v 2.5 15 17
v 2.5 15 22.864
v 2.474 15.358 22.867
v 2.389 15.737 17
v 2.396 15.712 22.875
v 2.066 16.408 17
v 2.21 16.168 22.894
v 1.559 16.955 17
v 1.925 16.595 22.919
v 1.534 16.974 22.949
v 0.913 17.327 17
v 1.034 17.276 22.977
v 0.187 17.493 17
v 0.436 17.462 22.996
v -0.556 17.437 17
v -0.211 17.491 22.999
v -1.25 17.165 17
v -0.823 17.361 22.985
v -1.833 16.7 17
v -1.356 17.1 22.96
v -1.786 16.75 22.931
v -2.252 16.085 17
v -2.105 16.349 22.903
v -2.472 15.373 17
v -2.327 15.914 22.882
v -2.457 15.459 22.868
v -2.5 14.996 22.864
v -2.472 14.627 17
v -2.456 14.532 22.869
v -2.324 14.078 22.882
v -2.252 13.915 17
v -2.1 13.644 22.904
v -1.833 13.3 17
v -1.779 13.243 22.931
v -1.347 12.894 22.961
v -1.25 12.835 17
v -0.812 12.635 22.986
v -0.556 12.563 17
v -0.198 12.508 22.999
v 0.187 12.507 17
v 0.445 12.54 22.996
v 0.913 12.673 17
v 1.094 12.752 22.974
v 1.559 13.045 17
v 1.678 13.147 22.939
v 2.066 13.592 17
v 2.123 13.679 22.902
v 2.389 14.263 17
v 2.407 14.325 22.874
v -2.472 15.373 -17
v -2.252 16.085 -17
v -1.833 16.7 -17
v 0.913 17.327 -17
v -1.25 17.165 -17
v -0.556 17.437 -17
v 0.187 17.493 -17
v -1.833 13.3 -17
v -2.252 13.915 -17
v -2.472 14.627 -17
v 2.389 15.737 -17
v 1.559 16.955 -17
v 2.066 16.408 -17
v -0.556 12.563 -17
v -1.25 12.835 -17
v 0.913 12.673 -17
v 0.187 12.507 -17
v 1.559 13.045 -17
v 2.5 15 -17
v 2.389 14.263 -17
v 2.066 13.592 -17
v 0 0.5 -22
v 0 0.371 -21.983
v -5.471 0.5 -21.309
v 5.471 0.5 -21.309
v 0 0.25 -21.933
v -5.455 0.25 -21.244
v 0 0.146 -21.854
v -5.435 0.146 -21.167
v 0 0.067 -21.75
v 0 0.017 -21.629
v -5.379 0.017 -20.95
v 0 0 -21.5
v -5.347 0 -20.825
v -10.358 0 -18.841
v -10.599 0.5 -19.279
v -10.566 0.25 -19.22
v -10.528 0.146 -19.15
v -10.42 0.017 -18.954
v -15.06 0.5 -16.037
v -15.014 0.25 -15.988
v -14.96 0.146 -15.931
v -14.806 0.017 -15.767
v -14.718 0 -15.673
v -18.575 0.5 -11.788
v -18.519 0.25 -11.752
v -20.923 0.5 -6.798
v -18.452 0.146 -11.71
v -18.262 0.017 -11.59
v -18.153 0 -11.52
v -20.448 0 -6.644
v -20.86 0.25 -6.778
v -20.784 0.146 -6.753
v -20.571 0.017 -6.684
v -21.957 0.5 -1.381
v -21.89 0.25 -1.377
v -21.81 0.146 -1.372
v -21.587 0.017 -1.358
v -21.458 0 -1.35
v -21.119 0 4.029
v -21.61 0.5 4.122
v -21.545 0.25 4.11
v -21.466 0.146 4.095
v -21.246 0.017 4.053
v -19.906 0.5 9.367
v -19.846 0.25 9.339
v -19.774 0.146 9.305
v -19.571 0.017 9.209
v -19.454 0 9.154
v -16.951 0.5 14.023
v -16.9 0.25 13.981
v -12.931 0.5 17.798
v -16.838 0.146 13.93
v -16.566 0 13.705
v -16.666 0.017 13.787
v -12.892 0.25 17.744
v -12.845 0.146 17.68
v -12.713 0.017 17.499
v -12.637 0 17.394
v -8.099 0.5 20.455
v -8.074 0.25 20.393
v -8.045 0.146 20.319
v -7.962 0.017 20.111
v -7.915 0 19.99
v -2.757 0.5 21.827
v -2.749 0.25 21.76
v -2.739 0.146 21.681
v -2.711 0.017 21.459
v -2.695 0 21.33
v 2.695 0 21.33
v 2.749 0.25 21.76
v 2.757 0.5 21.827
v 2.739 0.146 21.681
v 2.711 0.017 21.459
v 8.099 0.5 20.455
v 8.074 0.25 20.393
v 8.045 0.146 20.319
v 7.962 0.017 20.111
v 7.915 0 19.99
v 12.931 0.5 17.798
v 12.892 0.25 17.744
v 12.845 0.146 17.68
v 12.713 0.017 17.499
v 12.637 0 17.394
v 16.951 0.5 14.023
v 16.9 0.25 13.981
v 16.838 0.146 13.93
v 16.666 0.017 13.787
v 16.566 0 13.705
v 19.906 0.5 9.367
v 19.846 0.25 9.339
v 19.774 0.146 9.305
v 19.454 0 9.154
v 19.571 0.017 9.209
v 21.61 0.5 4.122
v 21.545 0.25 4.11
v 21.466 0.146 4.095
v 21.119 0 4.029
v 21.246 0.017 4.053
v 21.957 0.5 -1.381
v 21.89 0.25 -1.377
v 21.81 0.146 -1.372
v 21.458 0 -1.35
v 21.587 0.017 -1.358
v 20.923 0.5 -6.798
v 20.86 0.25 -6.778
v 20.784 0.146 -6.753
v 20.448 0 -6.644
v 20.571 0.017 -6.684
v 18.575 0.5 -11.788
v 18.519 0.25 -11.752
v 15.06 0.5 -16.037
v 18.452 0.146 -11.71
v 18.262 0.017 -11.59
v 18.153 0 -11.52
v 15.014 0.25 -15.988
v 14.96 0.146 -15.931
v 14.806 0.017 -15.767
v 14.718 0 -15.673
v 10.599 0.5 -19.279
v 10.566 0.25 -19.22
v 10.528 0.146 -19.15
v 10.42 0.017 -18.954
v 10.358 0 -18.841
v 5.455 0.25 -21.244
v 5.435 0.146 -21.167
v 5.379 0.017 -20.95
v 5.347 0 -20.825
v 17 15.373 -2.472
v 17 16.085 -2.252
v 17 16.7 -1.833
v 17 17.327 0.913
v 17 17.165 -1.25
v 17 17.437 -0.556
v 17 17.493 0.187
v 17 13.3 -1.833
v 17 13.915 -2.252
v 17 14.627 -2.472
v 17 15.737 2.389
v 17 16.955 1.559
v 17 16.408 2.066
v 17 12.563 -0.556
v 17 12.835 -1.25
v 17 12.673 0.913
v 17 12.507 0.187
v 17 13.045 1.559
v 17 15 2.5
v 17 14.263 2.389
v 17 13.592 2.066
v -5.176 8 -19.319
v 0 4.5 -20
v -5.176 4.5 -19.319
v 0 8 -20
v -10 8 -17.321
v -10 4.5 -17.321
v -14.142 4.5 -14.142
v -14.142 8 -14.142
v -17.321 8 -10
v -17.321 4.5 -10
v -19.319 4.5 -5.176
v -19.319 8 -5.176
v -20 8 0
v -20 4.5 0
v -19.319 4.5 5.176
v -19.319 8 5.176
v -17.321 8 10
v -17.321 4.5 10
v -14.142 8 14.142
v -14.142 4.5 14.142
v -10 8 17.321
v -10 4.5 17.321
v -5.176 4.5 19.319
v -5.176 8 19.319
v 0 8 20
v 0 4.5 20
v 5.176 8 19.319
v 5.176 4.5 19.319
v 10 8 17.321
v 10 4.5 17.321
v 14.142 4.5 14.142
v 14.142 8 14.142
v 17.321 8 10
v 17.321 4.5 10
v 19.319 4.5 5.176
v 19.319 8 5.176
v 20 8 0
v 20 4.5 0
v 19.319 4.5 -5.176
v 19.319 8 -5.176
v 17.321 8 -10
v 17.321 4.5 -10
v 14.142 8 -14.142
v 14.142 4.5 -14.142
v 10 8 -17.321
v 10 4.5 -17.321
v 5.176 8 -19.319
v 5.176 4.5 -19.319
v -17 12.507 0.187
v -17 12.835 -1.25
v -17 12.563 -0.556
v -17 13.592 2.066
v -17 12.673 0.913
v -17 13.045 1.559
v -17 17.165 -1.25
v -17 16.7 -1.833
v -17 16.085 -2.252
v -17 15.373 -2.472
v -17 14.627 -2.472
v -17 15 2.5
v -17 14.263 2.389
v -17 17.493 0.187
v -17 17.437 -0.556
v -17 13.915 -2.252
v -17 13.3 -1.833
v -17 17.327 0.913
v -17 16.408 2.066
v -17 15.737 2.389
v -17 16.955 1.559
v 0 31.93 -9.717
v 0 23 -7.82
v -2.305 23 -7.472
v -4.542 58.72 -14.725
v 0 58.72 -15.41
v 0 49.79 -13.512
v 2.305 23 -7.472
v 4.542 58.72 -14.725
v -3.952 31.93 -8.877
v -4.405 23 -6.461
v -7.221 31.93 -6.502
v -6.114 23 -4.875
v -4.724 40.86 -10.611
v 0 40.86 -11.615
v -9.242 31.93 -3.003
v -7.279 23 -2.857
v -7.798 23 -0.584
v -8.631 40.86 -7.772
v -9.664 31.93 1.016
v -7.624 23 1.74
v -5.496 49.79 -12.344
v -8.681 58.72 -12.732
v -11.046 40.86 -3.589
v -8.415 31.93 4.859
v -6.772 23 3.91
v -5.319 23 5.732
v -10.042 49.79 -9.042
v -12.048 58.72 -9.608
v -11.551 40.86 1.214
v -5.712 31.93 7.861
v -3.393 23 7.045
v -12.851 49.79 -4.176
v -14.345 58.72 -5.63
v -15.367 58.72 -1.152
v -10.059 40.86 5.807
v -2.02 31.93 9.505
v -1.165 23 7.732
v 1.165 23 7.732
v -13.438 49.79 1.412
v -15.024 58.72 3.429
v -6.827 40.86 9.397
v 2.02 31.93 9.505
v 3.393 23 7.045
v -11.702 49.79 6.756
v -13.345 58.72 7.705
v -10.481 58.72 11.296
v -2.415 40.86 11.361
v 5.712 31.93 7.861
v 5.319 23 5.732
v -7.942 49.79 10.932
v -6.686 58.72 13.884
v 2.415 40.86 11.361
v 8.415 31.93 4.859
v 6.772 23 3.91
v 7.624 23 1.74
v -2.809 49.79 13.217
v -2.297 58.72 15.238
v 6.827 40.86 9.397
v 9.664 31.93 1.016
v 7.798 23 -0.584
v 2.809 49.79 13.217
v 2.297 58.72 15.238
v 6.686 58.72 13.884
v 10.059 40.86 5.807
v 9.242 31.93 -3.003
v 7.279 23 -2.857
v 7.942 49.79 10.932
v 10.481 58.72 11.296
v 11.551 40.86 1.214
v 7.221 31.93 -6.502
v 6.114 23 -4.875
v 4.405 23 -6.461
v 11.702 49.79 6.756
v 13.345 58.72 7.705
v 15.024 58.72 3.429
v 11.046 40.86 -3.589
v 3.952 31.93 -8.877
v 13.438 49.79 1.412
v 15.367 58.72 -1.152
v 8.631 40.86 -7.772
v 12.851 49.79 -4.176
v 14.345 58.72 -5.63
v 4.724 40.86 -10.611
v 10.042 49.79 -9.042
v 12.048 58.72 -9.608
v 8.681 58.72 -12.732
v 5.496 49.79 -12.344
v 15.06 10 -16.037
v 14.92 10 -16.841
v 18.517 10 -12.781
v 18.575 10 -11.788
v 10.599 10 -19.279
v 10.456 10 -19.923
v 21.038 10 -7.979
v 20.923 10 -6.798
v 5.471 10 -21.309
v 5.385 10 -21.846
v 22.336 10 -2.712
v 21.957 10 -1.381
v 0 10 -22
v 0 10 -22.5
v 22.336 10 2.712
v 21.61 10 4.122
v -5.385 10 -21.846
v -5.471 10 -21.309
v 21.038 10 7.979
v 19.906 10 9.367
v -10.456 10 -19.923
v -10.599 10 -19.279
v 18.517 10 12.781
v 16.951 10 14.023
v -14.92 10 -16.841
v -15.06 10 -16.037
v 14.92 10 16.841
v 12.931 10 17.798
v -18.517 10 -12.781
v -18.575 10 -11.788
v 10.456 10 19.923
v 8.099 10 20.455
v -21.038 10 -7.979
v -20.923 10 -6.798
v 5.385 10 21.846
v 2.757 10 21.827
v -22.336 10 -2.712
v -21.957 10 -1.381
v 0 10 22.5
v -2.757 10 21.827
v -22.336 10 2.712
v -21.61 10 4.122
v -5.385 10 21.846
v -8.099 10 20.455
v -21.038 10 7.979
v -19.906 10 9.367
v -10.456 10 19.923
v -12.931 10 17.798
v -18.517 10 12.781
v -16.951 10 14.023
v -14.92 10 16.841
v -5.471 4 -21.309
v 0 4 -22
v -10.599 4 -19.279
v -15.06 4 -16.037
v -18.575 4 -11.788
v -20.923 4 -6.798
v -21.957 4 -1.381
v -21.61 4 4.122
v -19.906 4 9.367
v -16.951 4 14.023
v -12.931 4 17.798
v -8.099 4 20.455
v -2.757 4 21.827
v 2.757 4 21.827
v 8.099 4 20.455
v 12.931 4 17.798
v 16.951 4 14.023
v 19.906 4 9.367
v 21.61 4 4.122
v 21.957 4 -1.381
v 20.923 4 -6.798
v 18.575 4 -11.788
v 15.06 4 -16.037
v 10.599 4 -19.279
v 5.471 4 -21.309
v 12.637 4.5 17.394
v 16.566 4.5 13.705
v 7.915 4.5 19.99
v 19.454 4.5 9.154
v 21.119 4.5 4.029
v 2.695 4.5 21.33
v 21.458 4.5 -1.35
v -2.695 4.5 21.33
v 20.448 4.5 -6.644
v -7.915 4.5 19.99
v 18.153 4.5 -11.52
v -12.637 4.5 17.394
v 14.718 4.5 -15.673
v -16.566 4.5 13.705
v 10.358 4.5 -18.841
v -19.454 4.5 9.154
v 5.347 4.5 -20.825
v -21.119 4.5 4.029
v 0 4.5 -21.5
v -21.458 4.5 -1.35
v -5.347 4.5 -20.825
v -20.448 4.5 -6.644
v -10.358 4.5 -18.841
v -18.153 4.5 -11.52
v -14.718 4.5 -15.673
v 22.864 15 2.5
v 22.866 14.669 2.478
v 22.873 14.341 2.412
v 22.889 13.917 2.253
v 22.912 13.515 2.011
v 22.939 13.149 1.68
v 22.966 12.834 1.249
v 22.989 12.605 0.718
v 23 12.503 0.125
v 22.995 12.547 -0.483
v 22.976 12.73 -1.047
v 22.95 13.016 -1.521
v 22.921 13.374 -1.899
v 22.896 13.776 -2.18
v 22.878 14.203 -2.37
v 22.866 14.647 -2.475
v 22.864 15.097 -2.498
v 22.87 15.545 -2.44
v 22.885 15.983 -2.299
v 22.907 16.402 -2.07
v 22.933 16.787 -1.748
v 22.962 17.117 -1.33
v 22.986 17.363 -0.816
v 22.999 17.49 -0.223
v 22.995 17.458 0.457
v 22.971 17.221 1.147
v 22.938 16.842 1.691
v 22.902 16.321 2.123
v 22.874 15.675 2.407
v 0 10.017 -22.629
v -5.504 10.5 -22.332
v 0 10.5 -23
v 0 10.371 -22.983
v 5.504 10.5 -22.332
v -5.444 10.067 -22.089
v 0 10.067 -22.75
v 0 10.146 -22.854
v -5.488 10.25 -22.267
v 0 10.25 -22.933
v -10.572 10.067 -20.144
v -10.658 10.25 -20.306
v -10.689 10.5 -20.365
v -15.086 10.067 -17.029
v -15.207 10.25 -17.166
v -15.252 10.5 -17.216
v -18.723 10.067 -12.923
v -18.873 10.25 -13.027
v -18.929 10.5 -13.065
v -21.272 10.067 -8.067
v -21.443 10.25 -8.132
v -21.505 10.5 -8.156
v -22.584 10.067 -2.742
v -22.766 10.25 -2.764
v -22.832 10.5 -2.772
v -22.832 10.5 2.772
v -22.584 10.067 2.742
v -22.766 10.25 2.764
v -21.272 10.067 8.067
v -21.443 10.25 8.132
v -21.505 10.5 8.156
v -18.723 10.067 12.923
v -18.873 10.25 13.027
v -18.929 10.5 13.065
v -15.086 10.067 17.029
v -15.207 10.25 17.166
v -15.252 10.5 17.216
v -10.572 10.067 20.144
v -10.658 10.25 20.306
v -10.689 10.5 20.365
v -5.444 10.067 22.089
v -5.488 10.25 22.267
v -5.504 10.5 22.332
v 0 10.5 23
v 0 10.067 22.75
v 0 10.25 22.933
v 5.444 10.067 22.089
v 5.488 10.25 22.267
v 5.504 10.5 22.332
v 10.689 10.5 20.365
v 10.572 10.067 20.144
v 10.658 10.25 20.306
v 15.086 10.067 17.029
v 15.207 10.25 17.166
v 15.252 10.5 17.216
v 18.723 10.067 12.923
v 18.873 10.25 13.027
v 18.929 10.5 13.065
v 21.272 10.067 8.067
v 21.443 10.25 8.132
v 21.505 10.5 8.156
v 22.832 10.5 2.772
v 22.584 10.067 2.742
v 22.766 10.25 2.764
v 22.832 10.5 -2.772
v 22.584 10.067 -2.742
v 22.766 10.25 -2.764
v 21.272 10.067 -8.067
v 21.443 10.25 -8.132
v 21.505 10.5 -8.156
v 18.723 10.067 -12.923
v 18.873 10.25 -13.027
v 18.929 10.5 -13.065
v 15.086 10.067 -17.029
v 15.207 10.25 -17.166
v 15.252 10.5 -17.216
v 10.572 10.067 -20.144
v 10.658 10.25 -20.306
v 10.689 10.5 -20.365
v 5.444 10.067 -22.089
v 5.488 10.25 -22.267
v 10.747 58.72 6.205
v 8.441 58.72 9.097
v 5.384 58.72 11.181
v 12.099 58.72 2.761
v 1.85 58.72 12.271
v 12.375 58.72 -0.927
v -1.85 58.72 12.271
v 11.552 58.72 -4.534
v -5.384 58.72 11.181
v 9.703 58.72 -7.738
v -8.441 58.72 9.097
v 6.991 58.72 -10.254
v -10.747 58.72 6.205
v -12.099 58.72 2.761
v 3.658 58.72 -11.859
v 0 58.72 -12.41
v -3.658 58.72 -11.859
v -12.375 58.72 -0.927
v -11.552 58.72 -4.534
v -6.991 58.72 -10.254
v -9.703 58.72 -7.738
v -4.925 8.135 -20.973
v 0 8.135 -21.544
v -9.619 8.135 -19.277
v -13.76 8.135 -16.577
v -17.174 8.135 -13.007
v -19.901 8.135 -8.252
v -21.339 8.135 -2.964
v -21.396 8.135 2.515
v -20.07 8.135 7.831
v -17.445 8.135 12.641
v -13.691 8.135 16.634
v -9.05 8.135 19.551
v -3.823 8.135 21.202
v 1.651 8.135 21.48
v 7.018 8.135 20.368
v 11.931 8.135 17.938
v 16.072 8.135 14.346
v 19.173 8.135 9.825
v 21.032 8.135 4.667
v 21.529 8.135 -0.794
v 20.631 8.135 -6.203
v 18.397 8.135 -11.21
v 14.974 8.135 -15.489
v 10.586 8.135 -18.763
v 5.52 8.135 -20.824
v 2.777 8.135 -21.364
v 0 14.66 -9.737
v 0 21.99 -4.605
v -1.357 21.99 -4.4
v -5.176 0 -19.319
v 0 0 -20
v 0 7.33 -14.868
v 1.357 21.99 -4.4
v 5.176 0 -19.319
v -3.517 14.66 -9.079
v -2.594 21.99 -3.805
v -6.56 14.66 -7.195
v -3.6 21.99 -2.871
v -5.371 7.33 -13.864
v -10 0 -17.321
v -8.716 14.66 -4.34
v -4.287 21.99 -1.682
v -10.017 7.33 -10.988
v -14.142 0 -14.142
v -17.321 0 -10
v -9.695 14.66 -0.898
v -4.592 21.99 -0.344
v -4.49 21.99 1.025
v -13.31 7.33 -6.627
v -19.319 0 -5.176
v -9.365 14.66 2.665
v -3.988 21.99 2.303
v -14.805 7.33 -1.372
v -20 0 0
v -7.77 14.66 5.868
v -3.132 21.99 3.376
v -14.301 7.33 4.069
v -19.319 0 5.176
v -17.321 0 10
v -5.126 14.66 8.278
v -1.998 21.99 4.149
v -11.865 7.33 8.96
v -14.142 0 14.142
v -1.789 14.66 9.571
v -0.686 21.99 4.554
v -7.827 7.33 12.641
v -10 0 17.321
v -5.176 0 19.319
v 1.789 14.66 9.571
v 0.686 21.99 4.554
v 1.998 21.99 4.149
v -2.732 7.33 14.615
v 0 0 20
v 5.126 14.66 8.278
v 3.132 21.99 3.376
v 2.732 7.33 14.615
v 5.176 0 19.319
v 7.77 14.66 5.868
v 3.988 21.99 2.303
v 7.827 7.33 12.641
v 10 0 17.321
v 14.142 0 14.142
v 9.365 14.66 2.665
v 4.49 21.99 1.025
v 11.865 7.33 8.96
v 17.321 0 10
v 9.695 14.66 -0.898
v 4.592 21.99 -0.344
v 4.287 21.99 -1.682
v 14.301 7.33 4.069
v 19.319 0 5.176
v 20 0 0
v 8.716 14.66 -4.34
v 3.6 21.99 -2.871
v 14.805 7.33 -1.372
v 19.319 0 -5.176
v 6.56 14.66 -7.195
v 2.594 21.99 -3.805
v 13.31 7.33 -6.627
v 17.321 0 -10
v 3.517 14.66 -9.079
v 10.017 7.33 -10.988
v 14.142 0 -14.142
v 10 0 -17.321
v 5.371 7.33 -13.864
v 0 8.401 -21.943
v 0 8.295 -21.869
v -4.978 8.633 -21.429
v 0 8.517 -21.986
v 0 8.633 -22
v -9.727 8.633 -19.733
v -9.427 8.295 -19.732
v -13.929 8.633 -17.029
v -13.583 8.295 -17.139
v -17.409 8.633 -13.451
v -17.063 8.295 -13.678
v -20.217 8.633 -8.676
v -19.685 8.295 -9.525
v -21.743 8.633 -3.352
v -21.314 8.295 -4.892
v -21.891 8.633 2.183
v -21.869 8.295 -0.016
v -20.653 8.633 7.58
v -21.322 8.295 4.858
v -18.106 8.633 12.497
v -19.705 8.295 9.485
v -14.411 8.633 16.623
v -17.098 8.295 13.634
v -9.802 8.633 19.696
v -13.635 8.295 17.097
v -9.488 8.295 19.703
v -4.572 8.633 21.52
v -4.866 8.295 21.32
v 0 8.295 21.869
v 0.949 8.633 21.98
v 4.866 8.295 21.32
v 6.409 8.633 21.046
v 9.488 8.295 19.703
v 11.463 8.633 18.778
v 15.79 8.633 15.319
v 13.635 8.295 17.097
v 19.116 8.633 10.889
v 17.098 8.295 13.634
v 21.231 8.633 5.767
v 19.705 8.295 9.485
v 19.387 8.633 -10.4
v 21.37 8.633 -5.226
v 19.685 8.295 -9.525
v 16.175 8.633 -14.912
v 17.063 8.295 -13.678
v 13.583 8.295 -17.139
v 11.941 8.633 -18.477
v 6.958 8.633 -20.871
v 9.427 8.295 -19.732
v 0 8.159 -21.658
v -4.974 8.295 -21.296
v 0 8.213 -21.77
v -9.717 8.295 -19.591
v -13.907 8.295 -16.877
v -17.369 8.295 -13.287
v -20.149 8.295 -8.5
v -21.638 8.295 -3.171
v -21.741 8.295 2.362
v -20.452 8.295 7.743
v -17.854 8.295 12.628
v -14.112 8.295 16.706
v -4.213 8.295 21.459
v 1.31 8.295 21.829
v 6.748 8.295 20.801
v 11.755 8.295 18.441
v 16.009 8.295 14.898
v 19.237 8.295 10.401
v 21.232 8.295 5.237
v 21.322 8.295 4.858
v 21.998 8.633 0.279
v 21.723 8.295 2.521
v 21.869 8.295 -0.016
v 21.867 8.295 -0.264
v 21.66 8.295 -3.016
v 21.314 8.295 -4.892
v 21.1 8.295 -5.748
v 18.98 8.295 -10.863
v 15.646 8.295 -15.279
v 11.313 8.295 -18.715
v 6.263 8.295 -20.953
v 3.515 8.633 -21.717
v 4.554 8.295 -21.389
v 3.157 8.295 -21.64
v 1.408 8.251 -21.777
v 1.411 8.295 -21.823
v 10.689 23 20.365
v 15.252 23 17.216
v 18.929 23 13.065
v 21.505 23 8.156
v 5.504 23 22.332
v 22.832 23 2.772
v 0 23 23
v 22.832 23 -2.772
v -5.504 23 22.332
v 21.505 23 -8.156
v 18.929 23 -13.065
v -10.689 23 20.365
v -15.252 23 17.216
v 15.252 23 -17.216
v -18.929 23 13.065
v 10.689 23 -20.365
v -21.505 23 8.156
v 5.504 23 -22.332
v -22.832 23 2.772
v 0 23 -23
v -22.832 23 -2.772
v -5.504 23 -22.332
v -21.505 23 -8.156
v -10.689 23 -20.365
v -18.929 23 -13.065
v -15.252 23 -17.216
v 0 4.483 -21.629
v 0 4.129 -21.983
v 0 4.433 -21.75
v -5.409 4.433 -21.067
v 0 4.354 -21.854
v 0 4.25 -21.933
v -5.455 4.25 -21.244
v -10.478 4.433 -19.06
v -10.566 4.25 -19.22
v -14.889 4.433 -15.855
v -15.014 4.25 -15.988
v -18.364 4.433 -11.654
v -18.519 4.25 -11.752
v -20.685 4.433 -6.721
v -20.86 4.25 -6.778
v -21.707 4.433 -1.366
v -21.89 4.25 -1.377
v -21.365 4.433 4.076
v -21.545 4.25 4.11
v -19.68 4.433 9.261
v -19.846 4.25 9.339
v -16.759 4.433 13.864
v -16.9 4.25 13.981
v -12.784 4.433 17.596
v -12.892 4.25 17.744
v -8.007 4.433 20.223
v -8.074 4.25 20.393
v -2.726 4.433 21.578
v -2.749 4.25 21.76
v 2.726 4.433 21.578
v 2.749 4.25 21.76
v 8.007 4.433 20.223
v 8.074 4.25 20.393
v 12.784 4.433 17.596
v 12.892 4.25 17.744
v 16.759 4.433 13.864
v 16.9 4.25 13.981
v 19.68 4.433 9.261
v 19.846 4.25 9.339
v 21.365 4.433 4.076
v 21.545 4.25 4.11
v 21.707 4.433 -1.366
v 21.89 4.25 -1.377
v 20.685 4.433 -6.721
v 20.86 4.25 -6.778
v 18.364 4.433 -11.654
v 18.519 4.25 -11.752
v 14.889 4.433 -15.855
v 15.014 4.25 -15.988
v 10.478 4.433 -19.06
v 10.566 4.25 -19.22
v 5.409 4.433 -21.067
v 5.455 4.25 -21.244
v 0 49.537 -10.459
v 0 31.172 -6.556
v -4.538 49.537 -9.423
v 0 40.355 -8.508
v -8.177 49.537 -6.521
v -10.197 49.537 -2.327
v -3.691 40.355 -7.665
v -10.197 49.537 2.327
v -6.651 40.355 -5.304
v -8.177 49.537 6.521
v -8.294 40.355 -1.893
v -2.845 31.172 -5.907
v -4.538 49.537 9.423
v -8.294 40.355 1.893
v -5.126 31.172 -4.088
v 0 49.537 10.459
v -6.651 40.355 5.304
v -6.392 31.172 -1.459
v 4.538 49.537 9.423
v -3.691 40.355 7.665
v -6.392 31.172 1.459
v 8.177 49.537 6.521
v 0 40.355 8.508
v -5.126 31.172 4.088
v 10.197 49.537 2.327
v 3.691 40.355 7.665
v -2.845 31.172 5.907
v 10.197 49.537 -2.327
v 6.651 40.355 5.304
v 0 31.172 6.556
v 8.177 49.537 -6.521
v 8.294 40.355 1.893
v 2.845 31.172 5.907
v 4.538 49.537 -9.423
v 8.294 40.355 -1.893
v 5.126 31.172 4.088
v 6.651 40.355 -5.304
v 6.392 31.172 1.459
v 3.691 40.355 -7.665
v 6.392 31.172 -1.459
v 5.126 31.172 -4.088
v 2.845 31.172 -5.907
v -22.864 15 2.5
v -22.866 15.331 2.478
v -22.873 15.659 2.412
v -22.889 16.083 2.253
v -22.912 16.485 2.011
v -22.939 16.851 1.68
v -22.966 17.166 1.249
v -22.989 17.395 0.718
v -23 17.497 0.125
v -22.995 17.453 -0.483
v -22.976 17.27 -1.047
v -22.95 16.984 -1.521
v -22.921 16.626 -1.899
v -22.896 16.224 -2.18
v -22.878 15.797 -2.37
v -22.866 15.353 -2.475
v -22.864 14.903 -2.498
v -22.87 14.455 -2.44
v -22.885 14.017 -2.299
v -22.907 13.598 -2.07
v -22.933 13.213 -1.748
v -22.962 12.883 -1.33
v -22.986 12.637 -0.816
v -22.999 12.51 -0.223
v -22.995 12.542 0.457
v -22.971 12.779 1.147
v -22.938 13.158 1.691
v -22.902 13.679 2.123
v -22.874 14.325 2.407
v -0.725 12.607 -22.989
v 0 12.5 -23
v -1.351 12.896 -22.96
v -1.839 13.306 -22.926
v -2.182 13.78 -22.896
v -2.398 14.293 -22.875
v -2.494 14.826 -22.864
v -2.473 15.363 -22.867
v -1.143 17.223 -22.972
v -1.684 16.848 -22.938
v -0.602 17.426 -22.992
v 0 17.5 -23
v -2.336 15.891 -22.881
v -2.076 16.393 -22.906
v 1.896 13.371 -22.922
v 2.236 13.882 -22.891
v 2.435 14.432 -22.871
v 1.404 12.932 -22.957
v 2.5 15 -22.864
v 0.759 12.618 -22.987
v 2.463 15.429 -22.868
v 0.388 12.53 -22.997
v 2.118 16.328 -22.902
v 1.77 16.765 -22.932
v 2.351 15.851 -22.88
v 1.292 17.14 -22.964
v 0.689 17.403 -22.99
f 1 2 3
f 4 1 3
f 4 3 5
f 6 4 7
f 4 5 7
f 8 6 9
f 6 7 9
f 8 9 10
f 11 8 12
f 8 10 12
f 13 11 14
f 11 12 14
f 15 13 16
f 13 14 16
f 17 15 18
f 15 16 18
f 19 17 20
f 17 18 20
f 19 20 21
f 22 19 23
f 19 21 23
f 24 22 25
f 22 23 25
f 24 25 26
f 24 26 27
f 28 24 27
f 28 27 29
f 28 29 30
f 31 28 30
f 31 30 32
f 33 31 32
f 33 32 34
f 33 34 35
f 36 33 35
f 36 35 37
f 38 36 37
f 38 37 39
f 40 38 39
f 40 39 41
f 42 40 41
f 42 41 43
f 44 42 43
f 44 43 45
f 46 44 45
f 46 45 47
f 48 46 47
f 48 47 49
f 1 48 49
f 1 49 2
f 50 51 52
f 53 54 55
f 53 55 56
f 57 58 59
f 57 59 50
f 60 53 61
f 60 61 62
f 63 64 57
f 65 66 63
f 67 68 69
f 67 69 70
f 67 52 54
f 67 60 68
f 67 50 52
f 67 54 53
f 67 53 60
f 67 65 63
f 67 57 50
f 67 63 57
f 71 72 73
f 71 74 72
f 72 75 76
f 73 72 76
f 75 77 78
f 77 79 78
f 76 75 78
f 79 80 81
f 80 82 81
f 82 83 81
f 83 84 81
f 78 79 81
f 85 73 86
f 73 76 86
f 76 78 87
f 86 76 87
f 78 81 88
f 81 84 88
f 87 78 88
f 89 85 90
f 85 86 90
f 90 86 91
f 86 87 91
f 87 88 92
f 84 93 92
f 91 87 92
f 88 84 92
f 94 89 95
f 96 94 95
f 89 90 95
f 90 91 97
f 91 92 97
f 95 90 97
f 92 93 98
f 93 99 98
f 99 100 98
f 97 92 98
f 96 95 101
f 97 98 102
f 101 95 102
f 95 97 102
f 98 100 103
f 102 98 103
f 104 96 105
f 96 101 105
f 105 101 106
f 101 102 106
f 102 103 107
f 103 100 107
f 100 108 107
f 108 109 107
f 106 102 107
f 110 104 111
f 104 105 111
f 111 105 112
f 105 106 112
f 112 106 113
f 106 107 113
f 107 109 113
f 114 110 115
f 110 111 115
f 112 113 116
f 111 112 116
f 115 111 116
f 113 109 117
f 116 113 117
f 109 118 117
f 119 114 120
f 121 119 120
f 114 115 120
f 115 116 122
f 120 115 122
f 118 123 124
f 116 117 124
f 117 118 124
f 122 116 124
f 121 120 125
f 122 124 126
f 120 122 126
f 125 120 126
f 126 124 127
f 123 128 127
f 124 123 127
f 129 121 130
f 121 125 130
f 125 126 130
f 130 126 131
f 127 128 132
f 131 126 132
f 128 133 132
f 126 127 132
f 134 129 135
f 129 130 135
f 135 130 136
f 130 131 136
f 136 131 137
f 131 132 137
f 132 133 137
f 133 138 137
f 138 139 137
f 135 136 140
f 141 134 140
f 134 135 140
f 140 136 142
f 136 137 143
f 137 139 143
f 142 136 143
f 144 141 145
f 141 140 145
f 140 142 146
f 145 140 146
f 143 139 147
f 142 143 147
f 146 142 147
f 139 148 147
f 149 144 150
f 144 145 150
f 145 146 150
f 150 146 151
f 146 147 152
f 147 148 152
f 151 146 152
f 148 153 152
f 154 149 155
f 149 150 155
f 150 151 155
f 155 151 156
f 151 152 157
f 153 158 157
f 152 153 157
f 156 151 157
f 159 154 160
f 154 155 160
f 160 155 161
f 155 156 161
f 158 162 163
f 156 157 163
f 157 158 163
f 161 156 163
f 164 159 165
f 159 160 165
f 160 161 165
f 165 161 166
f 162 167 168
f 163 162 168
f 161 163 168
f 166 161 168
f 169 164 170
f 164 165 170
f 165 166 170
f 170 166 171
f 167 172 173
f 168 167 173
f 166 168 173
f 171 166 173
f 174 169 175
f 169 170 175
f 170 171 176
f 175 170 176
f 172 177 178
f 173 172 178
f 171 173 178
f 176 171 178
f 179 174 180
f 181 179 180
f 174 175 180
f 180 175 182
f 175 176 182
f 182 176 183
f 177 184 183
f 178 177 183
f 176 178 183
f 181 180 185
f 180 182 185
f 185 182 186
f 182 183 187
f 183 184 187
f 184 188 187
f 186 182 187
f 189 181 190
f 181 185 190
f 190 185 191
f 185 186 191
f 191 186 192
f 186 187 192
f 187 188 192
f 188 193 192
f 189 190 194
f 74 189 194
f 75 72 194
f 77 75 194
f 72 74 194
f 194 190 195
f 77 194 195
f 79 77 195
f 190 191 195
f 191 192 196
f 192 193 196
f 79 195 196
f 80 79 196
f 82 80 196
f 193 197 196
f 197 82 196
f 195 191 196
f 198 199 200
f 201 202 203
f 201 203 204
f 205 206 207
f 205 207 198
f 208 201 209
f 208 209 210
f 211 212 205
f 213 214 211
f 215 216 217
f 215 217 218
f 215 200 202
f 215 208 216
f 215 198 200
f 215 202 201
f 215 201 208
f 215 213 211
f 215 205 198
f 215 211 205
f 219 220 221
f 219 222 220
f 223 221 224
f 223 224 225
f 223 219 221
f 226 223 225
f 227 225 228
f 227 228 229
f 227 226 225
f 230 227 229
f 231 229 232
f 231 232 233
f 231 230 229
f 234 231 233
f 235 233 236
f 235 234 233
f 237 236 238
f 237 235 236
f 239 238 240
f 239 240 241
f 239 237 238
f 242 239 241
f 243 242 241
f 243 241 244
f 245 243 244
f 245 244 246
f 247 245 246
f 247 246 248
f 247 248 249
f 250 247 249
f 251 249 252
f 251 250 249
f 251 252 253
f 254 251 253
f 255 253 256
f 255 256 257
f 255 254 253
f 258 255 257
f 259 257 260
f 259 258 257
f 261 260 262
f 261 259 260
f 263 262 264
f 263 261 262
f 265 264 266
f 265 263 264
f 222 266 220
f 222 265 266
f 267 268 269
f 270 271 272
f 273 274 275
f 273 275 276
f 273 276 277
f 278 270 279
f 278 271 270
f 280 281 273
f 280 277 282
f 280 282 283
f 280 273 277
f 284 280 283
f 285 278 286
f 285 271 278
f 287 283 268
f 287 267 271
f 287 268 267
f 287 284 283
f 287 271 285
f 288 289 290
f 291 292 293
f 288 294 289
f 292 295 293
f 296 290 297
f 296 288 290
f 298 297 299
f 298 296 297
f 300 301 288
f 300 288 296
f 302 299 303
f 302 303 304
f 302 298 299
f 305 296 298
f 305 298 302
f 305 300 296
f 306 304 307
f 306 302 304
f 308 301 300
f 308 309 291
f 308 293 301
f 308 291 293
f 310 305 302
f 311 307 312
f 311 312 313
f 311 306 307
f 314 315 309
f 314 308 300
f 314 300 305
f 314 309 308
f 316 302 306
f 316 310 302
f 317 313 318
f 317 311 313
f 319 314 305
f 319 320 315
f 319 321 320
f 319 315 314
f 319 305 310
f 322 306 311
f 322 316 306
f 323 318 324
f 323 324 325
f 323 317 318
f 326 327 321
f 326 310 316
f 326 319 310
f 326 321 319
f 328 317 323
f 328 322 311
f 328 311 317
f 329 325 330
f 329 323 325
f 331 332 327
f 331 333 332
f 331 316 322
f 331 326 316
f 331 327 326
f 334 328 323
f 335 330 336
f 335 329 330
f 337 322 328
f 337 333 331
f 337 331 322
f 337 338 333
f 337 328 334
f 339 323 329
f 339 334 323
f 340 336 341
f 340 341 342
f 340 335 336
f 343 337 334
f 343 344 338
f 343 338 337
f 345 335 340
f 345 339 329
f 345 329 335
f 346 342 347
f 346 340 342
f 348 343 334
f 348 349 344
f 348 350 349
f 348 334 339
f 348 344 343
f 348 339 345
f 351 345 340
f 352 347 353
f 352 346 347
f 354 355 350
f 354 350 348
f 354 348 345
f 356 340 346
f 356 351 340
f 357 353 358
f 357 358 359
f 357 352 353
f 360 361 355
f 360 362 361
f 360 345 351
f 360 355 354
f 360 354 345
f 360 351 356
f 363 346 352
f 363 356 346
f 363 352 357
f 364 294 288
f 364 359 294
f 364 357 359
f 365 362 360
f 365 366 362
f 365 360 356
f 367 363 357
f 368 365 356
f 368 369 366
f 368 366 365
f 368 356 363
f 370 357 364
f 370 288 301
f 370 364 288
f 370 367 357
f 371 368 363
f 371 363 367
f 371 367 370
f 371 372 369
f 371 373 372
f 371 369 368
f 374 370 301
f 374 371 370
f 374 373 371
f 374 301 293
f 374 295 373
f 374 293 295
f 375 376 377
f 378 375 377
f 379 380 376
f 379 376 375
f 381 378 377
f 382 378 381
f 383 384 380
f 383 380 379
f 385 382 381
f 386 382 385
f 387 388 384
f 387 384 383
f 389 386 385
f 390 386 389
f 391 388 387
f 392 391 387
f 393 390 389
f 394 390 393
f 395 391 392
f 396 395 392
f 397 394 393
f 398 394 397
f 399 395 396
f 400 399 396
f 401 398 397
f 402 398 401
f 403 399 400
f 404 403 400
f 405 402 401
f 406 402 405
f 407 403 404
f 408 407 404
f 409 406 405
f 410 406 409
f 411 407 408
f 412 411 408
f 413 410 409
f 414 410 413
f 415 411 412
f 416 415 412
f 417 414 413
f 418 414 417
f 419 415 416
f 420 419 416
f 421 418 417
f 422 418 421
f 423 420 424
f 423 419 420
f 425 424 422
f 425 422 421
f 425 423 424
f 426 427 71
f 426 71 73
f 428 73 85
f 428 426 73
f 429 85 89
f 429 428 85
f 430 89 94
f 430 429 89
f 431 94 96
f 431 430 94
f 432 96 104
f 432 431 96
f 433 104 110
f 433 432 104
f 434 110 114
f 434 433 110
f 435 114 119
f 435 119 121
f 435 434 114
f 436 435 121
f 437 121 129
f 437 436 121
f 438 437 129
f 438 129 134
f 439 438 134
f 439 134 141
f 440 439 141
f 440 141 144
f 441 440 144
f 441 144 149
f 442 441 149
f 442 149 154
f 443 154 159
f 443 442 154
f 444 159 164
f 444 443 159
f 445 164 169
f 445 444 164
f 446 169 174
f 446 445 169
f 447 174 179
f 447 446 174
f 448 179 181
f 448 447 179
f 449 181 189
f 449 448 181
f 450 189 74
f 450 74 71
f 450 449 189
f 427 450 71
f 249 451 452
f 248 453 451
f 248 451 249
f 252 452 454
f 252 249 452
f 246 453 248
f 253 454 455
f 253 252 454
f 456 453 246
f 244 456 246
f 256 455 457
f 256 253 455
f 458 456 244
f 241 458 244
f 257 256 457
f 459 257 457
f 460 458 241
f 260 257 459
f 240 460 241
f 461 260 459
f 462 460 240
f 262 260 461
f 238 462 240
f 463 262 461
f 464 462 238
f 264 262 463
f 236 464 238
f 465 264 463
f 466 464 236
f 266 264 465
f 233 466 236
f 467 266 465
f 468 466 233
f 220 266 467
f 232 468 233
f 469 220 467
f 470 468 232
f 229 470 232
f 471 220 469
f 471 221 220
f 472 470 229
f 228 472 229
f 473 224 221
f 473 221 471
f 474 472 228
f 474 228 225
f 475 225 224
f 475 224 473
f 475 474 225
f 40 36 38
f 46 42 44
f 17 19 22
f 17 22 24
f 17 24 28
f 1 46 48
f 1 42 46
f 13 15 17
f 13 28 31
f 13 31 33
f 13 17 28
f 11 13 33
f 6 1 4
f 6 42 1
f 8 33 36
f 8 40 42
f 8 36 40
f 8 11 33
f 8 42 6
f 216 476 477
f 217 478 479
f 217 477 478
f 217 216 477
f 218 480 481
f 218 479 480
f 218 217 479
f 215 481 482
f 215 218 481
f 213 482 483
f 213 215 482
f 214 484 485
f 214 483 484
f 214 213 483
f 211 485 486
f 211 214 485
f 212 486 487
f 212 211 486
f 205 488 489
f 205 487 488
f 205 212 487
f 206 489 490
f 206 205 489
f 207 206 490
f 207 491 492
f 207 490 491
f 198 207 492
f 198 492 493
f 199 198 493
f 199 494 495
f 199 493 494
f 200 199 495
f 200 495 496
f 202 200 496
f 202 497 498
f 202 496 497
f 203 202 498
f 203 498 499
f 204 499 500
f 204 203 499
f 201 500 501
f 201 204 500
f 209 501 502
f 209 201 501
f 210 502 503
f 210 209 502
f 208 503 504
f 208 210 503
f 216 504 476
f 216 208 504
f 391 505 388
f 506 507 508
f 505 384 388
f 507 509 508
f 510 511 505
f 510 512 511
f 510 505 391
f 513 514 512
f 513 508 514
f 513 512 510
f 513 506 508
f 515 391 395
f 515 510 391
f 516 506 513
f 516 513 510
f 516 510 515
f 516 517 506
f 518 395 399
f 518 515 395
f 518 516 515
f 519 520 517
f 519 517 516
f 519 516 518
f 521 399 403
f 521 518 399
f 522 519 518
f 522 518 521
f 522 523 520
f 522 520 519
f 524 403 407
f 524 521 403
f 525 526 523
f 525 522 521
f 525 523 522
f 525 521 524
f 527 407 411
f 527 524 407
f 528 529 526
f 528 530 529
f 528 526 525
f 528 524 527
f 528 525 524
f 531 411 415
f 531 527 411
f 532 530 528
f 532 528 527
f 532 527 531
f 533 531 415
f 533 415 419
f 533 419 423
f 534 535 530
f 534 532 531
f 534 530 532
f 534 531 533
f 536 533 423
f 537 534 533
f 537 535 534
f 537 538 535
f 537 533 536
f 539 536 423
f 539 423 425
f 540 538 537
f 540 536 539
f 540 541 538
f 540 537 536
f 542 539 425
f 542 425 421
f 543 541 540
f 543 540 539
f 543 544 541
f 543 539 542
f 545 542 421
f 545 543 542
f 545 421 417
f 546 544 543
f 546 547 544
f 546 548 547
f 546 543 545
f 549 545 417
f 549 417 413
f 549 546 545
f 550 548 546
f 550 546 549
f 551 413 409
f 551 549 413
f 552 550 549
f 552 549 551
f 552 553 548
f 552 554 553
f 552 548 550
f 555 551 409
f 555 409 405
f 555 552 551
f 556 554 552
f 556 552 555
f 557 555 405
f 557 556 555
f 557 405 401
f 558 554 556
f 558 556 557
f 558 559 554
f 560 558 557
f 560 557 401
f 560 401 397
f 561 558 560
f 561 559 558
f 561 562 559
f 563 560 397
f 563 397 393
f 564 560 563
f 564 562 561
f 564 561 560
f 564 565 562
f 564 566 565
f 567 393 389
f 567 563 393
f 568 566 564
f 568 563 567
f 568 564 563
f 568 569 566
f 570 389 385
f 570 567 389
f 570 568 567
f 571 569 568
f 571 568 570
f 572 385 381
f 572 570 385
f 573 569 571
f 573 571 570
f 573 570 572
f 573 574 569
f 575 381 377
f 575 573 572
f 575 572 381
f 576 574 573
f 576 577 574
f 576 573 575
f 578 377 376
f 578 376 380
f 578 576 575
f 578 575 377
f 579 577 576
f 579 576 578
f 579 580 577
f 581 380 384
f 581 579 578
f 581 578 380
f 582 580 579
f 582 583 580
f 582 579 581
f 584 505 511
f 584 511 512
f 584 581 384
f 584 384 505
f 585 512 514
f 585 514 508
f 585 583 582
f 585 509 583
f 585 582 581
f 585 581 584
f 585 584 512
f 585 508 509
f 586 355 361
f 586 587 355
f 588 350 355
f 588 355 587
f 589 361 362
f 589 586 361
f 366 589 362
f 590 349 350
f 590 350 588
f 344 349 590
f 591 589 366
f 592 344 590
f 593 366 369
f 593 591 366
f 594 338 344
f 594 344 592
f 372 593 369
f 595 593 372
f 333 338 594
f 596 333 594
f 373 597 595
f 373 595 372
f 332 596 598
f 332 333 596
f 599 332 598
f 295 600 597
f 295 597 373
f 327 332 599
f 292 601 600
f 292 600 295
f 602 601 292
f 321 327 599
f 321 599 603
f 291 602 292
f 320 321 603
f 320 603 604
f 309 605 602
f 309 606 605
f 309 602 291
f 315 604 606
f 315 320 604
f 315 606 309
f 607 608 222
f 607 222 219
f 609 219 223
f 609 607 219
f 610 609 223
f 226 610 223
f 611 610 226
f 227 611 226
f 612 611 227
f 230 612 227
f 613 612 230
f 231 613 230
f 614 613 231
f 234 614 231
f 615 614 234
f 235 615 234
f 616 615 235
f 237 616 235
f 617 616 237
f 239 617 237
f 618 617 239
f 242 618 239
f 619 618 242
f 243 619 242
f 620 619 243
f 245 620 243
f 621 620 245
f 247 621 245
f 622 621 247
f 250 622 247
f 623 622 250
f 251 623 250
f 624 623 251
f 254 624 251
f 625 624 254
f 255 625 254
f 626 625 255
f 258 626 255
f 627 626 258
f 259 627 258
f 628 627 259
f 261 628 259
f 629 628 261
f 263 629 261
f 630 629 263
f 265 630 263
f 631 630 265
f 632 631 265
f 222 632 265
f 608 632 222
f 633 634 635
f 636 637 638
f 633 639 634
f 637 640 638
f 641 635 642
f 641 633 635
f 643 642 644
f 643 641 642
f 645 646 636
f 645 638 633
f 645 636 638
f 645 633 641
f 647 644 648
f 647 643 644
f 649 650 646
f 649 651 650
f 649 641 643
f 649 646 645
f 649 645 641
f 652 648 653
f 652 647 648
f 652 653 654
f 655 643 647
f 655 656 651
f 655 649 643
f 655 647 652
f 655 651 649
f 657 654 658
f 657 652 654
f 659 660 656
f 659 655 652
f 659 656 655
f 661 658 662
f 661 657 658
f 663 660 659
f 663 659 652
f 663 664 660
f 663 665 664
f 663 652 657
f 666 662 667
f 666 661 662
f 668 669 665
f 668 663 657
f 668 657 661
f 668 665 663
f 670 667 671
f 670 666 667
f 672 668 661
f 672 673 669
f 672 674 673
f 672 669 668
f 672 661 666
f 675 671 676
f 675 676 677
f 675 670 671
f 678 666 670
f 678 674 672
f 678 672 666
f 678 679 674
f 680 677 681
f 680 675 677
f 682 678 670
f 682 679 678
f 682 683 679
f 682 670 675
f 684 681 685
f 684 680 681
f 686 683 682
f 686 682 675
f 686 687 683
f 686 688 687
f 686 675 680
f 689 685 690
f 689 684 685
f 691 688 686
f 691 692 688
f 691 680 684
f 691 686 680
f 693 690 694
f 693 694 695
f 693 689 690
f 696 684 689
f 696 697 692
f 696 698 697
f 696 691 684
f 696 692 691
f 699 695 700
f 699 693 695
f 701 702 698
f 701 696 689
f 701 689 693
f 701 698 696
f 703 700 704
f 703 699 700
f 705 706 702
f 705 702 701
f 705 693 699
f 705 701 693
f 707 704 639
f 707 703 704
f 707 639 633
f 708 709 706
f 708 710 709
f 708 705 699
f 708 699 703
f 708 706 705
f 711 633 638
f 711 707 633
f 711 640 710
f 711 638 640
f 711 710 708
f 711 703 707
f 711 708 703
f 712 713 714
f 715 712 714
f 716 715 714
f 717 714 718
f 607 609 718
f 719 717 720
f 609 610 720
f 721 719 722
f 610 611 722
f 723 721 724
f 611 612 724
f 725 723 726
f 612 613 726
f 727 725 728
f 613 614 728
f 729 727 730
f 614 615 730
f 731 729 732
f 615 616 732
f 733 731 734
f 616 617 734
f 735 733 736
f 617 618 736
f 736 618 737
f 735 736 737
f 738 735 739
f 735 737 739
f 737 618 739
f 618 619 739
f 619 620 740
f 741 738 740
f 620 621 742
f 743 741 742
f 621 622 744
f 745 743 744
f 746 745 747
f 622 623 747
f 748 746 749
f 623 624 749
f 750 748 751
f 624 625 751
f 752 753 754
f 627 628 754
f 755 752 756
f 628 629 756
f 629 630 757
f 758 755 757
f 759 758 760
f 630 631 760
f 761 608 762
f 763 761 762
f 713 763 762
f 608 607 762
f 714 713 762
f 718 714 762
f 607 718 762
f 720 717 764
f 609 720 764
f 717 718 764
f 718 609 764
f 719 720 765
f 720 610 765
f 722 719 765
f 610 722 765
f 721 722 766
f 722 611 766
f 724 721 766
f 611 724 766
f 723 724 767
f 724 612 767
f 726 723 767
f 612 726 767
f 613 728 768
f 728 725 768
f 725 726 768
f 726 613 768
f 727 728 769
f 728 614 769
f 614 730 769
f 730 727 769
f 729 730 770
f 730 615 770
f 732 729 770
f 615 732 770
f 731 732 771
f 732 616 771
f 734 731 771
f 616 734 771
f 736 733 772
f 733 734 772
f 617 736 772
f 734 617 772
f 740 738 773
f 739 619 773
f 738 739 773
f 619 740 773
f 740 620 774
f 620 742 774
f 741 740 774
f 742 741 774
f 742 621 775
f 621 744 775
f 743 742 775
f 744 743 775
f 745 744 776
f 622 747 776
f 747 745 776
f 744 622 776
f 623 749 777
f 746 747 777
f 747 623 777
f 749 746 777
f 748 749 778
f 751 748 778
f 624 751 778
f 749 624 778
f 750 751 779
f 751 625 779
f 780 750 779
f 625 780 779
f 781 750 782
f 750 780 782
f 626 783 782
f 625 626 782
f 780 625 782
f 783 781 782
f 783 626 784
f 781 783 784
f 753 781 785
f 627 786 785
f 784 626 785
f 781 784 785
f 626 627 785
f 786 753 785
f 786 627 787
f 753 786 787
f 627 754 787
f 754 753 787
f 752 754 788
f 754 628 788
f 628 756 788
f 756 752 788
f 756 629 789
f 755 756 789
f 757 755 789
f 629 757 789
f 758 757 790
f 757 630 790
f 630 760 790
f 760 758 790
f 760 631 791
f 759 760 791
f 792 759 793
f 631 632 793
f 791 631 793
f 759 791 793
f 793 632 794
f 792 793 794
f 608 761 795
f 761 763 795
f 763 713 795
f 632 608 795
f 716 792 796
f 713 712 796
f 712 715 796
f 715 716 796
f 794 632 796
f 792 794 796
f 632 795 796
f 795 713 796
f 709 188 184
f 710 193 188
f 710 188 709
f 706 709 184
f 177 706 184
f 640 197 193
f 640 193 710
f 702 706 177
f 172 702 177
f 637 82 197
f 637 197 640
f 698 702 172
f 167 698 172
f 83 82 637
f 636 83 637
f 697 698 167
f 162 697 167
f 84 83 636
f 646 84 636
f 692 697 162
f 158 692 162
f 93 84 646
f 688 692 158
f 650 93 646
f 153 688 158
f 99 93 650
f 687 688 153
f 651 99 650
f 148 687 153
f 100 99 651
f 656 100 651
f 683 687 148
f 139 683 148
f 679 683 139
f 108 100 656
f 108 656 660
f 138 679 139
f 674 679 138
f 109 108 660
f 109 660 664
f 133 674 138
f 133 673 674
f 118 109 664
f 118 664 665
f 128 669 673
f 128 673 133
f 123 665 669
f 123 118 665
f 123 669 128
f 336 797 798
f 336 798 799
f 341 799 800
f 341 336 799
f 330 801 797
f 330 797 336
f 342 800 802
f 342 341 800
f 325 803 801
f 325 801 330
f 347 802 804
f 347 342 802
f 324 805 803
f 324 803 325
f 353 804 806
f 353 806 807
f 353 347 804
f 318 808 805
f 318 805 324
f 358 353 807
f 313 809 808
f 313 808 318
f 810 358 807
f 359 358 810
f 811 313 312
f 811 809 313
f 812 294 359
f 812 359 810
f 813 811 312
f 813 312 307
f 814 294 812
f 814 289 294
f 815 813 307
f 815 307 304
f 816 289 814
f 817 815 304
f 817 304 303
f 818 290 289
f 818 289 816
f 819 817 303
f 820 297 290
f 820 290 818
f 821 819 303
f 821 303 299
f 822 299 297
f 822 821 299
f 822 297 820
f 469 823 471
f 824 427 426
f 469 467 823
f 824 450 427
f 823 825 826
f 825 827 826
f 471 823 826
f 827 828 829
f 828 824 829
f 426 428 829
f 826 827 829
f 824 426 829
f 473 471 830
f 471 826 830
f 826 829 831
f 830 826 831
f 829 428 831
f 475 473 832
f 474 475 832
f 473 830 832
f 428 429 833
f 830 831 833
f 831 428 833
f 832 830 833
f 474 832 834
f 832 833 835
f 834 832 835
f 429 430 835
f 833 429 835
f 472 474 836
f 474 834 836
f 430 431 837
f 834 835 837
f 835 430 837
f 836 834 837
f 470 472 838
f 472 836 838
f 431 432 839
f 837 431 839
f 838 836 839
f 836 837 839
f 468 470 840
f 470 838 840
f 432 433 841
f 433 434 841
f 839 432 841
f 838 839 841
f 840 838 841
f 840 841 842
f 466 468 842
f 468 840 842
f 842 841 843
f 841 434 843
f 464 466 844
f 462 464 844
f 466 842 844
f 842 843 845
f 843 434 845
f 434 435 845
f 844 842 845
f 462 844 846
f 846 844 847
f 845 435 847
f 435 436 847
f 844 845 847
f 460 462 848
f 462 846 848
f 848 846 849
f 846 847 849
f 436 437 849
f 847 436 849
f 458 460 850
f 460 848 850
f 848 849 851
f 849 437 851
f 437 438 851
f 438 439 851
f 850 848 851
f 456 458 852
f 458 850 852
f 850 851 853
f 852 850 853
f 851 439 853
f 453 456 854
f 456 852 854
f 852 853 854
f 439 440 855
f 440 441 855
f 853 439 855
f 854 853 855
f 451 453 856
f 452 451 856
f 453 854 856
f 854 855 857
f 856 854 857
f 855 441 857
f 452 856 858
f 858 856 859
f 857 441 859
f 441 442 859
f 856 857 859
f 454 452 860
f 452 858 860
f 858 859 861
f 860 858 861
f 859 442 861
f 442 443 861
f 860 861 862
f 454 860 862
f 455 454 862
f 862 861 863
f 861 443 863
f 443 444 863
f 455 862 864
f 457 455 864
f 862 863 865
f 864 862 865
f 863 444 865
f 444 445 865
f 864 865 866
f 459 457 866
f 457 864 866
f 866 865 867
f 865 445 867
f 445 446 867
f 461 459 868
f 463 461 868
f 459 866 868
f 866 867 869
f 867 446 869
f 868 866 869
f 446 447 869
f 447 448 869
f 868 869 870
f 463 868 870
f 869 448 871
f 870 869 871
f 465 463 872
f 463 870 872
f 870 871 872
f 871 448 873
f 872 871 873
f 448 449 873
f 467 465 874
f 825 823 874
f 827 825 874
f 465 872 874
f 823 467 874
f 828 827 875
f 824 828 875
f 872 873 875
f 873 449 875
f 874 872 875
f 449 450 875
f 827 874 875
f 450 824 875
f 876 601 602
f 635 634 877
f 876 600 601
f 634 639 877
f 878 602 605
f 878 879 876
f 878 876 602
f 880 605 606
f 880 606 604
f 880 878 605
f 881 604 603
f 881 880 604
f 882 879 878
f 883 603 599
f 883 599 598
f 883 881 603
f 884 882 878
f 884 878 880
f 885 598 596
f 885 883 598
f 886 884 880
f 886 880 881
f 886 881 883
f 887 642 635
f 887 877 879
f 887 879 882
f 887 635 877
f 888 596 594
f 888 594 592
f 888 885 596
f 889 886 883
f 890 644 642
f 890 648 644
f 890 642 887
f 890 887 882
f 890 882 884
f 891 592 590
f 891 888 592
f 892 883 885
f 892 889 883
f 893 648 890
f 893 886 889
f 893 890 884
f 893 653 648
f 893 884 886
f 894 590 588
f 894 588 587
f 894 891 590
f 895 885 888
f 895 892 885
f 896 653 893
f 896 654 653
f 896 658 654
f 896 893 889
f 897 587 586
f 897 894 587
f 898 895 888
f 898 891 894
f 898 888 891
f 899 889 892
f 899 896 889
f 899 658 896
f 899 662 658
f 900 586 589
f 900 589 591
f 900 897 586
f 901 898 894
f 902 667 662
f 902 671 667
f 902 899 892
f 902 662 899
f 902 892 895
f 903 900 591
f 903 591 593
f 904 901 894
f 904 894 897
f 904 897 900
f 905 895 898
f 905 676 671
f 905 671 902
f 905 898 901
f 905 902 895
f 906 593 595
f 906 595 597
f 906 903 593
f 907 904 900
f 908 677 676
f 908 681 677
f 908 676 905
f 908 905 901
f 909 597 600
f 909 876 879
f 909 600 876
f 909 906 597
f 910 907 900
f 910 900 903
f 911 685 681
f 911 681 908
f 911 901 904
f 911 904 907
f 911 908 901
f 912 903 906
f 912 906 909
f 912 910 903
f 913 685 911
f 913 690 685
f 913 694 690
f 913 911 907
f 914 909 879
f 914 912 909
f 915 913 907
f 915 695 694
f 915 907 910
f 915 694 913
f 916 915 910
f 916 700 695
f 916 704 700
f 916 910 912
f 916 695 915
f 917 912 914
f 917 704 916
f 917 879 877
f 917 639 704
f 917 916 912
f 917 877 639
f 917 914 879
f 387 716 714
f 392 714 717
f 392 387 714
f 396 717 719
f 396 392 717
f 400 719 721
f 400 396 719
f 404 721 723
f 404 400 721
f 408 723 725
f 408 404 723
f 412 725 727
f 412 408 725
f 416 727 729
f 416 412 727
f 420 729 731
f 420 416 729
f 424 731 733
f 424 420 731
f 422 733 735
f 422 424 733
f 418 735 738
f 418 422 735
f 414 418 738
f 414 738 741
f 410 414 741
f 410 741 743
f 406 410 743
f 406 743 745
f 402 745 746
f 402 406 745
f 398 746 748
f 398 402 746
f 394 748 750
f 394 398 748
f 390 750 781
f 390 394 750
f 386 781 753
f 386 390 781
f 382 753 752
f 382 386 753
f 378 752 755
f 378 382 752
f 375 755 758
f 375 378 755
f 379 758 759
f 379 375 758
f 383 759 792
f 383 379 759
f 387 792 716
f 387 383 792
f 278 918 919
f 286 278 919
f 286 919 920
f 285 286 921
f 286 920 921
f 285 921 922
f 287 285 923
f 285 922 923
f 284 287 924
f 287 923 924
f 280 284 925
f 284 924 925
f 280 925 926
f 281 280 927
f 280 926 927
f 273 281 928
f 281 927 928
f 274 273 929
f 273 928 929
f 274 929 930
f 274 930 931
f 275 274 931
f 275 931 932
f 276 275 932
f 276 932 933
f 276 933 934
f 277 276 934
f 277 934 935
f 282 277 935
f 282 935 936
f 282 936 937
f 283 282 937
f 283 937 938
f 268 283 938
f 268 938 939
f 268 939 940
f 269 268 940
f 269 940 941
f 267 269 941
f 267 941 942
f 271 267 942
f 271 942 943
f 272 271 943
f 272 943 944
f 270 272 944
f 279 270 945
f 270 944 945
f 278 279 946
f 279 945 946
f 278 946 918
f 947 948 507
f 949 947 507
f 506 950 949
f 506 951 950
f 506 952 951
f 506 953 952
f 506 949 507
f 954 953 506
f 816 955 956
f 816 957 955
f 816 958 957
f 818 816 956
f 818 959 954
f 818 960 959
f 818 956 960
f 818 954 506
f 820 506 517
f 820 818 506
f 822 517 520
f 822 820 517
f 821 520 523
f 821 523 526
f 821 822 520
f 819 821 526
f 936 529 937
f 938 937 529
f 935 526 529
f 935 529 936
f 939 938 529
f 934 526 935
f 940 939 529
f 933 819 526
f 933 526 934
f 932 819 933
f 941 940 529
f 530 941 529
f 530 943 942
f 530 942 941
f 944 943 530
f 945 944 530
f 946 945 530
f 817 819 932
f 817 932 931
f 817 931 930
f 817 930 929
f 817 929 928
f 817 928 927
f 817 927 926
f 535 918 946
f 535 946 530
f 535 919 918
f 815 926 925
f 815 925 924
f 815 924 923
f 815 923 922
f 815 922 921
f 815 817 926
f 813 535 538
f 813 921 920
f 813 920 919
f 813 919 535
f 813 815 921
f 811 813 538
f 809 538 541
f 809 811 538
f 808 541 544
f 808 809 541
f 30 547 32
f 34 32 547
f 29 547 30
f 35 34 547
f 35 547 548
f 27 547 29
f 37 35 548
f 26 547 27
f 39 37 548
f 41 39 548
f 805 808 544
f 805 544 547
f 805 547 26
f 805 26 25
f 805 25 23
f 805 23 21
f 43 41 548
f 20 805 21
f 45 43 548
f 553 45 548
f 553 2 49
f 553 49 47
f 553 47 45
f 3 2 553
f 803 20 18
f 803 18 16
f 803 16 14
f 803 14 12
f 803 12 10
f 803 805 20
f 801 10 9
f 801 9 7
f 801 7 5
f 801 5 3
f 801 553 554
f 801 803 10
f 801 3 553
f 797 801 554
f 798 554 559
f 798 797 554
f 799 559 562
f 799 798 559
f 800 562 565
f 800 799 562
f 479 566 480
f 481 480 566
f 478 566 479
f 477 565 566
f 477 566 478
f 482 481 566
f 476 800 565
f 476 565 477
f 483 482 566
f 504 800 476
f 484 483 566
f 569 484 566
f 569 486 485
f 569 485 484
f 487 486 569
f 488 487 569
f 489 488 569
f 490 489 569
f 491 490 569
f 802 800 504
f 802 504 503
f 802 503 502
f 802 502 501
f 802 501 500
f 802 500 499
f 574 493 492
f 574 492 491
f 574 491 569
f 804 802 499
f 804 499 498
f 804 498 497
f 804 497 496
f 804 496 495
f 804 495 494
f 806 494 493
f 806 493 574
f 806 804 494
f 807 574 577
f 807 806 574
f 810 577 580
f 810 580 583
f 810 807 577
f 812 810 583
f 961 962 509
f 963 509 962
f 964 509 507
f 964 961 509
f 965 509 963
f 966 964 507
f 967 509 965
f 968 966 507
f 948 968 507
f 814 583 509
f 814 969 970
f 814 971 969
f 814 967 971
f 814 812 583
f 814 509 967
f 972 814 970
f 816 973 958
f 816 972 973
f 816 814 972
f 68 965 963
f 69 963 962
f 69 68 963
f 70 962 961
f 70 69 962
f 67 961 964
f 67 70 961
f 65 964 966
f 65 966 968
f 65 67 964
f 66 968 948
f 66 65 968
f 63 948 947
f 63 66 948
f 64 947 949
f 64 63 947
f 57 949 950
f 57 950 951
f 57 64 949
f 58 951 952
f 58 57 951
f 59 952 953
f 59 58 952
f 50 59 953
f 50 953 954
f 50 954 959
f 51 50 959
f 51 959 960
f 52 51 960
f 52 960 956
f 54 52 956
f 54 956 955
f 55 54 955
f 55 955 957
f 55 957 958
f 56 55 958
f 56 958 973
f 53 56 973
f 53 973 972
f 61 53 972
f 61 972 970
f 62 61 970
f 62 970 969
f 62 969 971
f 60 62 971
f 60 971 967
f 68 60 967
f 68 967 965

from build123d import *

# Parameters (mm, degrees)
FILLET_3_R          = 0.5
FILLET_4_R          = 0.5
SKETCH_4_R          = 2.5
CUT_EXTRUDE_1_DEPTH = 6
SKETCH_5_R          = 2.5
CUT_EXTRUDE_2_DEPTH = 6
CUT_EXTRUDE_START   = -6
SKETCH_6_R          = 2.5
CUT_EXTRUDE_3_DEPTH = 6
SKETCH_7_R          = 2.5
CUT_EXTRUDE_4_DEPTH = 6
FILLET_5_R          = 0.5
FILLET_6_R          = 0.5


with BuildPart() as part:
    # 스케치1 → 회전2 (revolve)
    with BuildSketch(Plane.XY, mode=Mode.PRIVATE) as revolve_2_sk:
        Polygon((4.605, 21.99), (20, 0), (22, 0), (22, 4.5), (20, 4.5), (20, 8), (22, 8.174977327), (22, 10), (23, 10), (23, 23), (7.819621563, 23), (15.41, 58.72), (12.41, 58.72), align=None)
    revolve(revolve_2_sk.sketch.rotate(Axis((0, 0, 0), (0, 1, 0)), 90), axis=Axis((0, 0, 0), (0, 1, 0)))

    # 필렛3
    fillet_3_edges = [part.edges().sort_by_distance(p)[0] for p in [
        (0, 8.174977327, 22),
    ]]
    fillet(fillet_3_edges, radius=FILLET_3_R)

    # 필렛4
    fillet_4_edges = [part.edges().sort_by_distance(p)[0] for p in [
        (0, 4.5, 22),
    ]]
    fillet(fillet_4_edges, radius=FILLET_4_R)

    # 스케치4 → 컷-돌출1 (cut)
    with BuildSketch(Plane.ZY.offset(23)):
        with Locations((0, 15)):
            Circle(SKETCH_4_R)
    extrude(amount=-CUT_EXTRUDE_1_DEPTH, mode=Mode.SUBTRACT)

    # 스케치5 → 컷-돌출2 (cut)
    with BuildSketch(Plane.XY.offset(23)):
        with Locations((0, 15)):
            Circle(SKETCH_5_R)
    extrude(amount=-CUT_EXTRUDE_2_DEPTH, mode=Mode.SUBTRACT)

    # 스케치6 → 컷-돌출3 (cut)
    with BuildSketch(Plane(origin=(23, 0, 0), x_dir=(0, 0, -1), z_dir=(1, 0, 0)).offset(CUT_EXTRUDE_START)):
        with Locations(Location((0, 15, 0), (0, 0, 180))):
            Circle(SKETCH_6_R)
    extrude(amount=CUT_EXTRUDE_3_DEPTH, mode=Mode.SUBTRACT)

    # 스케치7 → 컷-돌출4 (cut)
    with BuildSketch(Plane(origin=(0, 0, -23), x_dir=(-1, 0, 0), z_dir=(0, 0, -1)).offset(CUT_EXTRUDE_START)):
        with Locations(Location((0, 15, 0), (0, 0, 180))):
            Circle(SKETCH_7_R)
    extrude(amount=CUT_EXTRUDE_4_DEPTH, mode=Mode.SUBTRACT)

    # 필렛5
    fillet_5_edges = [part.edges().sort_by_distance(p)[0] for p in [
        (0, 0, 22),
    ]]
    fillet(fillet_5_edges, radius=FILLET_5_R)

    # 필렛6
    fillet_6_edges = [part.edges().sort_by_distance(p)[0] for p in [
        (0, 10, 23),
    ]]
    fillet(fillet_6_edges, radius=FILLET_6_R)


solid = part.part
